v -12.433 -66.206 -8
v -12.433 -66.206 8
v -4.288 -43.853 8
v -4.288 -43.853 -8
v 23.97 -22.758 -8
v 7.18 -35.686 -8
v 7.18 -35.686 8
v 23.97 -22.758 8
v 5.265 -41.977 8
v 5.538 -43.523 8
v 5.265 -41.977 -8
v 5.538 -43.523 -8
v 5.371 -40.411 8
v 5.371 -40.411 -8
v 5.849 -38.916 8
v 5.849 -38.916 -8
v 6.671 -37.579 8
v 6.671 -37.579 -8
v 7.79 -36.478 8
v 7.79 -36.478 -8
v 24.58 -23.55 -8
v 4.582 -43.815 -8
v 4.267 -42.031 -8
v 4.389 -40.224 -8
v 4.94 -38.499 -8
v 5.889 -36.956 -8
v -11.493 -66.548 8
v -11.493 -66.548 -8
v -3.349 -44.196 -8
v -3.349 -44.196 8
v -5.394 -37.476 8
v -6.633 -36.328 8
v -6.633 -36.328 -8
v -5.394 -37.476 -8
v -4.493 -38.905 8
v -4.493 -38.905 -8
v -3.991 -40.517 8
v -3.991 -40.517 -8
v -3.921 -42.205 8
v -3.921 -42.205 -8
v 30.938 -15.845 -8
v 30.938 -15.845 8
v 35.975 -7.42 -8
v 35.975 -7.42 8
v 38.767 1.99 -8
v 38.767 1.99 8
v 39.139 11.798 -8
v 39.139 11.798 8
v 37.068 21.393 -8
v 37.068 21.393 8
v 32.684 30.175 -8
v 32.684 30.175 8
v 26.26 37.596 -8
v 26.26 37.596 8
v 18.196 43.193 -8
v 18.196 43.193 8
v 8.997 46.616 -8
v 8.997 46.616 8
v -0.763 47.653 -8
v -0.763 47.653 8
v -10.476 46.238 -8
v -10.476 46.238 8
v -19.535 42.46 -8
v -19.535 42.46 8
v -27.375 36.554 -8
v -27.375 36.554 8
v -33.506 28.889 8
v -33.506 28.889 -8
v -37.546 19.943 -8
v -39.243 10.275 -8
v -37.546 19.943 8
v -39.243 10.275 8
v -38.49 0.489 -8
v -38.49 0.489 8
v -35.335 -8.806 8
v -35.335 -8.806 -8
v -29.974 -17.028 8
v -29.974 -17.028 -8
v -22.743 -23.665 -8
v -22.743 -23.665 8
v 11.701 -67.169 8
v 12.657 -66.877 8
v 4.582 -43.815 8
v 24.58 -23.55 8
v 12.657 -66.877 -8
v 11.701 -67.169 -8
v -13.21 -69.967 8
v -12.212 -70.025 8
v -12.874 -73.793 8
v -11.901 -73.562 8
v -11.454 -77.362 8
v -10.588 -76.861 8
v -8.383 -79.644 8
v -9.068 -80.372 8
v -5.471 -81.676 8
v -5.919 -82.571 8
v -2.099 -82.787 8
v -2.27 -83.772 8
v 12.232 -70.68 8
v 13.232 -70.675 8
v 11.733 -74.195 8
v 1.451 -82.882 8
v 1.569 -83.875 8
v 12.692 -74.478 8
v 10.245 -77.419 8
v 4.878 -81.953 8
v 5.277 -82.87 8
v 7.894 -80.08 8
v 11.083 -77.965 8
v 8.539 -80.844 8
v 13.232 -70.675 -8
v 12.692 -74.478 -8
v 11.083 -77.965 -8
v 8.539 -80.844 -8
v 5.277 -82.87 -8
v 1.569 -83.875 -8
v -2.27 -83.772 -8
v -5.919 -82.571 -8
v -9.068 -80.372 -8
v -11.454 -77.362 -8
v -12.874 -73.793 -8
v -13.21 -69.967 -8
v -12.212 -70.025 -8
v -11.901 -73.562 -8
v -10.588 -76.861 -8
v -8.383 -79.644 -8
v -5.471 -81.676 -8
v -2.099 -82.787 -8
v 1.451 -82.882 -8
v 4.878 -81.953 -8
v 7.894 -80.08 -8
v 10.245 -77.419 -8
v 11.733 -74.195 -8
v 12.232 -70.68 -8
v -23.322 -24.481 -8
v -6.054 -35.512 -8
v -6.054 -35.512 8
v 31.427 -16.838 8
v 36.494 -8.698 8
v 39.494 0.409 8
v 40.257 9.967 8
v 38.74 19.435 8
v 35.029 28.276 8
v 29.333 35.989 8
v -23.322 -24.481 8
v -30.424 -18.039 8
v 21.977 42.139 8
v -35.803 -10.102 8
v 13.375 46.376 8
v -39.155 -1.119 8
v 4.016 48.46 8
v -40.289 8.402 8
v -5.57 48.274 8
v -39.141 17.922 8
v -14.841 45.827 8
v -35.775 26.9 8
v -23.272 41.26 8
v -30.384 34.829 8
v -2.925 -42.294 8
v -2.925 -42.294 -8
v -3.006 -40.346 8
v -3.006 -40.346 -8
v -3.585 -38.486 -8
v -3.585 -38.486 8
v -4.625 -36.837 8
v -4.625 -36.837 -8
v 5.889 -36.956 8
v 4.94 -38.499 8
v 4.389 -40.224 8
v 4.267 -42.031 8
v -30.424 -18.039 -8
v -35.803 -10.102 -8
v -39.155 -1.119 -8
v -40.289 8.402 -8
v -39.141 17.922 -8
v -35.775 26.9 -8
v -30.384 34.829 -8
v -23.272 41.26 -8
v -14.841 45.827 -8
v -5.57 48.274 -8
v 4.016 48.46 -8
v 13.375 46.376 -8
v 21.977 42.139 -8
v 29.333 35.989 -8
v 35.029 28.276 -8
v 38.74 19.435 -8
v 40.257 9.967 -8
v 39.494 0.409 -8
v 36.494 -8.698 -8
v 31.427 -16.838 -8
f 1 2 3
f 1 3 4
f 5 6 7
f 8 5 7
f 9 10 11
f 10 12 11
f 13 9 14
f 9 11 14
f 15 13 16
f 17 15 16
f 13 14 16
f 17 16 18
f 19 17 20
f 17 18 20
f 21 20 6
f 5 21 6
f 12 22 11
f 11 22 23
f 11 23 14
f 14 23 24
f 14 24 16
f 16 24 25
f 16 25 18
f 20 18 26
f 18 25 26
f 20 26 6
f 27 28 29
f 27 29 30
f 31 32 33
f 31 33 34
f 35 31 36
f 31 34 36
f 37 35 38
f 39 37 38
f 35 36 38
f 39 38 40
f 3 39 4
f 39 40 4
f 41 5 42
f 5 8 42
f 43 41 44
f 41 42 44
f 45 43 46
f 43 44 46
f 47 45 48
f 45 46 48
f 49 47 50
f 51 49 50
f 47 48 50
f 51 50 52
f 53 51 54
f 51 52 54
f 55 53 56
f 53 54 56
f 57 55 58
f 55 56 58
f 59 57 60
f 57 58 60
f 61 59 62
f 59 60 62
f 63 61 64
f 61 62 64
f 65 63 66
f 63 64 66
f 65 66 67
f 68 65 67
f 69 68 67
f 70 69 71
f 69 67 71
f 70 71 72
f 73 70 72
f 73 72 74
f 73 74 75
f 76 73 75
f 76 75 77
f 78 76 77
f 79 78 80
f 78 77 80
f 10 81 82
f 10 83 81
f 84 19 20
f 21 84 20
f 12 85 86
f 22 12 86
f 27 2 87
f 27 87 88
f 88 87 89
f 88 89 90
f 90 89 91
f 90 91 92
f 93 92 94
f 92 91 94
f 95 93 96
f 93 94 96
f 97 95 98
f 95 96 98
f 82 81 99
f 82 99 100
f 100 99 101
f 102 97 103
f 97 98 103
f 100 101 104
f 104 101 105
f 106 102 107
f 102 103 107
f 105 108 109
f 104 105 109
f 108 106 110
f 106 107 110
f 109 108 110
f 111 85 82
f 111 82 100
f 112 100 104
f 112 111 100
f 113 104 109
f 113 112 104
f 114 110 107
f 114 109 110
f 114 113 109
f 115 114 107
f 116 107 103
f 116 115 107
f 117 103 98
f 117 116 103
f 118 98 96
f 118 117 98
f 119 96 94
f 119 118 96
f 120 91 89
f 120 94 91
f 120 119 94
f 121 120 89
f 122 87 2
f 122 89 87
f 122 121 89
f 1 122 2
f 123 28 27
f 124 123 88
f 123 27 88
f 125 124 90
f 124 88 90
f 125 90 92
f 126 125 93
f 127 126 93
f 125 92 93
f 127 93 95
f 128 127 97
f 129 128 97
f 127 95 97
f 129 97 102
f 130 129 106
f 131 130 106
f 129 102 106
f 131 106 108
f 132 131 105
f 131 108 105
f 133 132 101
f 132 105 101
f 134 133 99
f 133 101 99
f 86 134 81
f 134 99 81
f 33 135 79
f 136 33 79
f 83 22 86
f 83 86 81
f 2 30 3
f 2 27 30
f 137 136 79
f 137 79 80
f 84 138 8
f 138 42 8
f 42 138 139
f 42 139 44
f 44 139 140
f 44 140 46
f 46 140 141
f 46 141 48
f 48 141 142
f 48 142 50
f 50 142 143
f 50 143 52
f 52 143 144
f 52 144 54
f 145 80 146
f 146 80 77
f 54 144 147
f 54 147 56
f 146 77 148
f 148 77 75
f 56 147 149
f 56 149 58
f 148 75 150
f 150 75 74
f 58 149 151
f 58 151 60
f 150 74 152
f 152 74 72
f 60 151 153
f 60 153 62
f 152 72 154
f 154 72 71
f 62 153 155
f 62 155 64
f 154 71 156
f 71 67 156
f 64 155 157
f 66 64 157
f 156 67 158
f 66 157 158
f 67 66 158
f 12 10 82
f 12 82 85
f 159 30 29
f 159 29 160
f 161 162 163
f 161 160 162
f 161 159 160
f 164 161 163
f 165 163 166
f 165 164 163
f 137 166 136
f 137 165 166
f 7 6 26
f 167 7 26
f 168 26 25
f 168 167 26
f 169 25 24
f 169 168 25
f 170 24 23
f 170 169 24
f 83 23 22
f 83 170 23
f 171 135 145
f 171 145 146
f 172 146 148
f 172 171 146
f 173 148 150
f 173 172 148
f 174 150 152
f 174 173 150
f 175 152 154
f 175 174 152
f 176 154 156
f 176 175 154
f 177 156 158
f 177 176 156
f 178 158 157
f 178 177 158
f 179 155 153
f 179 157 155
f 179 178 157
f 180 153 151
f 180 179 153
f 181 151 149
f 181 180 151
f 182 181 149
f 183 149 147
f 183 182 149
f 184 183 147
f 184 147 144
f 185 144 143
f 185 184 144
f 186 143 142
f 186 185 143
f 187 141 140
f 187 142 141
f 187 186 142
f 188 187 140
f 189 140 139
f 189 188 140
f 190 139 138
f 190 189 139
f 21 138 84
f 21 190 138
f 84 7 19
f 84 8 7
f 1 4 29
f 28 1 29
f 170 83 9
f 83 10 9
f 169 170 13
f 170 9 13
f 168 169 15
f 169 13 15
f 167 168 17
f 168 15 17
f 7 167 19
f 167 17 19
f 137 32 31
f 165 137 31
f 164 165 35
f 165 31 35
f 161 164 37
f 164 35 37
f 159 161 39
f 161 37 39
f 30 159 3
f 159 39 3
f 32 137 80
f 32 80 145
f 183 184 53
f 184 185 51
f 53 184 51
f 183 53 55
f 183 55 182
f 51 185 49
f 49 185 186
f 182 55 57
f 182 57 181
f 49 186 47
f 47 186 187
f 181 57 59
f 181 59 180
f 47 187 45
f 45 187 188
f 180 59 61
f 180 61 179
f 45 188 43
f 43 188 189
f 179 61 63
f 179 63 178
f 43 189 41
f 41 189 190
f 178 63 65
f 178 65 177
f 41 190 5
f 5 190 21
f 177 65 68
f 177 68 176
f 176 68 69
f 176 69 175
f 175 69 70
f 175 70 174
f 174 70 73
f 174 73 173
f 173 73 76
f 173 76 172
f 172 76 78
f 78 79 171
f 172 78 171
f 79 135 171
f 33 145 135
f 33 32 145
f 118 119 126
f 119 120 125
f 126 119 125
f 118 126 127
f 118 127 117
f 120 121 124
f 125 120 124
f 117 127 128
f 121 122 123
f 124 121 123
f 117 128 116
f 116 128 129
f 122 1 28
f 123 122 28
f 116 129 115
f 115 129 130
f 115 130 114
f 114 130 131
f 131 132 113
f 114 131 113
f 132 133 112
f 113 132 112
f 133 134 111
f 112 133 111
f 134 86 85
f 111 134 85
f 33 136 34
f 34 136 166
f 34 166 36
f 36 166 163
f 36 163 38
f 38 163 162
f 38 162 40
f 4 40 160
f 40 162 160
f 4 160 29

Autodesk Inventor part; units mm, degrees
sketch "Skizzenpfad" plane through (0, 0, 0) normal (0, 0, 1) x (1, 0, 0)
  arc A0 (24.2749, -23.1538) -> (-23.0321, -24.0729) centre (0, 8.3719) ccw
  arc A1 (7.4854, -36.0818) -> (5.0602, -43.6691) centre (11.756, -41.6281) ccw
  arc A2 (-11.963, -66.3767) -> (12.1791, -67.0232) centre (0, -70.7357) ccw
  arc A3 (-3.8183, -44.0246) -> (-6.3432, -35.9201) centre (-10.3952, -41.6281) ccw
  line L0 (-6.3432, -35.9201) -> (-23.0321, -24.0729)
  line L1 (24.2749, -23.1538) -> (7.4854, -36.0818)
  line L2 (5.0602, -43.6691) -> (12.1791, -67.0232)
  line L3 (-11.963, -66.3767) -> (-3.8183, -44.0246)
ref_plane "Querschnittsebene" through (-23.0321, -24.0729, 0) normal (0.8154, -0.5789, 0) x (0, 0, 1)
ref_plane "Arbeitsebene2" through (0, 8.3719, 0) normal (-1, 0, 0) x (0, 0, 1)
ref_plane "Arbeitsebene3" through (0, -70.7357, 0) normal (-0.136, 0.9907, 0) x (0, 0, 1)
sketch "Querschnitt" plane through (-23.0321, -24.0729, 0) normal (0.8154, -0.5789, 0) x (0, 0, 1)
  line L0 (-8, 0.5) -> (8, 0.5)
  line L1 (8, 0.5) -> (8, -0.5)
  line L2 (8, -0.5) -> (-8, -0.5)
  line L3 (-8, -0.5) -> (-8, 0.5)
  line L4 (-8, 0) -> (8, 0) construction
  point P0 (0, 0)
  point P1 (0, 0)
  dimension "d0" = 16
  dimension "d4" = 0.5
  dimension "d5" = 0.5
sweep "Riemen" add profiles "Querschnitt" path "Skizzenpfad"
equation "\"d0\" = da_B"
equation "\"d4\" = da_a"
equation "\"d5\" = da_a2"
equation "\"da_B\" = 16"
equation "\"da_pb\" = 5"
equation "\"da_L\" = 355"
equation "\"da_a\" = 0.5"
equation "\"da_S\" = 2.65"
equation "\"da_Beta\" = 20deg"
equation "\"da_Ht\" = 1.2"
equation "\"da_H\" = 2.2"
equation "\"da_a2\" = 0.5"
properties part number "Zahnriemen" material "Rubber"
